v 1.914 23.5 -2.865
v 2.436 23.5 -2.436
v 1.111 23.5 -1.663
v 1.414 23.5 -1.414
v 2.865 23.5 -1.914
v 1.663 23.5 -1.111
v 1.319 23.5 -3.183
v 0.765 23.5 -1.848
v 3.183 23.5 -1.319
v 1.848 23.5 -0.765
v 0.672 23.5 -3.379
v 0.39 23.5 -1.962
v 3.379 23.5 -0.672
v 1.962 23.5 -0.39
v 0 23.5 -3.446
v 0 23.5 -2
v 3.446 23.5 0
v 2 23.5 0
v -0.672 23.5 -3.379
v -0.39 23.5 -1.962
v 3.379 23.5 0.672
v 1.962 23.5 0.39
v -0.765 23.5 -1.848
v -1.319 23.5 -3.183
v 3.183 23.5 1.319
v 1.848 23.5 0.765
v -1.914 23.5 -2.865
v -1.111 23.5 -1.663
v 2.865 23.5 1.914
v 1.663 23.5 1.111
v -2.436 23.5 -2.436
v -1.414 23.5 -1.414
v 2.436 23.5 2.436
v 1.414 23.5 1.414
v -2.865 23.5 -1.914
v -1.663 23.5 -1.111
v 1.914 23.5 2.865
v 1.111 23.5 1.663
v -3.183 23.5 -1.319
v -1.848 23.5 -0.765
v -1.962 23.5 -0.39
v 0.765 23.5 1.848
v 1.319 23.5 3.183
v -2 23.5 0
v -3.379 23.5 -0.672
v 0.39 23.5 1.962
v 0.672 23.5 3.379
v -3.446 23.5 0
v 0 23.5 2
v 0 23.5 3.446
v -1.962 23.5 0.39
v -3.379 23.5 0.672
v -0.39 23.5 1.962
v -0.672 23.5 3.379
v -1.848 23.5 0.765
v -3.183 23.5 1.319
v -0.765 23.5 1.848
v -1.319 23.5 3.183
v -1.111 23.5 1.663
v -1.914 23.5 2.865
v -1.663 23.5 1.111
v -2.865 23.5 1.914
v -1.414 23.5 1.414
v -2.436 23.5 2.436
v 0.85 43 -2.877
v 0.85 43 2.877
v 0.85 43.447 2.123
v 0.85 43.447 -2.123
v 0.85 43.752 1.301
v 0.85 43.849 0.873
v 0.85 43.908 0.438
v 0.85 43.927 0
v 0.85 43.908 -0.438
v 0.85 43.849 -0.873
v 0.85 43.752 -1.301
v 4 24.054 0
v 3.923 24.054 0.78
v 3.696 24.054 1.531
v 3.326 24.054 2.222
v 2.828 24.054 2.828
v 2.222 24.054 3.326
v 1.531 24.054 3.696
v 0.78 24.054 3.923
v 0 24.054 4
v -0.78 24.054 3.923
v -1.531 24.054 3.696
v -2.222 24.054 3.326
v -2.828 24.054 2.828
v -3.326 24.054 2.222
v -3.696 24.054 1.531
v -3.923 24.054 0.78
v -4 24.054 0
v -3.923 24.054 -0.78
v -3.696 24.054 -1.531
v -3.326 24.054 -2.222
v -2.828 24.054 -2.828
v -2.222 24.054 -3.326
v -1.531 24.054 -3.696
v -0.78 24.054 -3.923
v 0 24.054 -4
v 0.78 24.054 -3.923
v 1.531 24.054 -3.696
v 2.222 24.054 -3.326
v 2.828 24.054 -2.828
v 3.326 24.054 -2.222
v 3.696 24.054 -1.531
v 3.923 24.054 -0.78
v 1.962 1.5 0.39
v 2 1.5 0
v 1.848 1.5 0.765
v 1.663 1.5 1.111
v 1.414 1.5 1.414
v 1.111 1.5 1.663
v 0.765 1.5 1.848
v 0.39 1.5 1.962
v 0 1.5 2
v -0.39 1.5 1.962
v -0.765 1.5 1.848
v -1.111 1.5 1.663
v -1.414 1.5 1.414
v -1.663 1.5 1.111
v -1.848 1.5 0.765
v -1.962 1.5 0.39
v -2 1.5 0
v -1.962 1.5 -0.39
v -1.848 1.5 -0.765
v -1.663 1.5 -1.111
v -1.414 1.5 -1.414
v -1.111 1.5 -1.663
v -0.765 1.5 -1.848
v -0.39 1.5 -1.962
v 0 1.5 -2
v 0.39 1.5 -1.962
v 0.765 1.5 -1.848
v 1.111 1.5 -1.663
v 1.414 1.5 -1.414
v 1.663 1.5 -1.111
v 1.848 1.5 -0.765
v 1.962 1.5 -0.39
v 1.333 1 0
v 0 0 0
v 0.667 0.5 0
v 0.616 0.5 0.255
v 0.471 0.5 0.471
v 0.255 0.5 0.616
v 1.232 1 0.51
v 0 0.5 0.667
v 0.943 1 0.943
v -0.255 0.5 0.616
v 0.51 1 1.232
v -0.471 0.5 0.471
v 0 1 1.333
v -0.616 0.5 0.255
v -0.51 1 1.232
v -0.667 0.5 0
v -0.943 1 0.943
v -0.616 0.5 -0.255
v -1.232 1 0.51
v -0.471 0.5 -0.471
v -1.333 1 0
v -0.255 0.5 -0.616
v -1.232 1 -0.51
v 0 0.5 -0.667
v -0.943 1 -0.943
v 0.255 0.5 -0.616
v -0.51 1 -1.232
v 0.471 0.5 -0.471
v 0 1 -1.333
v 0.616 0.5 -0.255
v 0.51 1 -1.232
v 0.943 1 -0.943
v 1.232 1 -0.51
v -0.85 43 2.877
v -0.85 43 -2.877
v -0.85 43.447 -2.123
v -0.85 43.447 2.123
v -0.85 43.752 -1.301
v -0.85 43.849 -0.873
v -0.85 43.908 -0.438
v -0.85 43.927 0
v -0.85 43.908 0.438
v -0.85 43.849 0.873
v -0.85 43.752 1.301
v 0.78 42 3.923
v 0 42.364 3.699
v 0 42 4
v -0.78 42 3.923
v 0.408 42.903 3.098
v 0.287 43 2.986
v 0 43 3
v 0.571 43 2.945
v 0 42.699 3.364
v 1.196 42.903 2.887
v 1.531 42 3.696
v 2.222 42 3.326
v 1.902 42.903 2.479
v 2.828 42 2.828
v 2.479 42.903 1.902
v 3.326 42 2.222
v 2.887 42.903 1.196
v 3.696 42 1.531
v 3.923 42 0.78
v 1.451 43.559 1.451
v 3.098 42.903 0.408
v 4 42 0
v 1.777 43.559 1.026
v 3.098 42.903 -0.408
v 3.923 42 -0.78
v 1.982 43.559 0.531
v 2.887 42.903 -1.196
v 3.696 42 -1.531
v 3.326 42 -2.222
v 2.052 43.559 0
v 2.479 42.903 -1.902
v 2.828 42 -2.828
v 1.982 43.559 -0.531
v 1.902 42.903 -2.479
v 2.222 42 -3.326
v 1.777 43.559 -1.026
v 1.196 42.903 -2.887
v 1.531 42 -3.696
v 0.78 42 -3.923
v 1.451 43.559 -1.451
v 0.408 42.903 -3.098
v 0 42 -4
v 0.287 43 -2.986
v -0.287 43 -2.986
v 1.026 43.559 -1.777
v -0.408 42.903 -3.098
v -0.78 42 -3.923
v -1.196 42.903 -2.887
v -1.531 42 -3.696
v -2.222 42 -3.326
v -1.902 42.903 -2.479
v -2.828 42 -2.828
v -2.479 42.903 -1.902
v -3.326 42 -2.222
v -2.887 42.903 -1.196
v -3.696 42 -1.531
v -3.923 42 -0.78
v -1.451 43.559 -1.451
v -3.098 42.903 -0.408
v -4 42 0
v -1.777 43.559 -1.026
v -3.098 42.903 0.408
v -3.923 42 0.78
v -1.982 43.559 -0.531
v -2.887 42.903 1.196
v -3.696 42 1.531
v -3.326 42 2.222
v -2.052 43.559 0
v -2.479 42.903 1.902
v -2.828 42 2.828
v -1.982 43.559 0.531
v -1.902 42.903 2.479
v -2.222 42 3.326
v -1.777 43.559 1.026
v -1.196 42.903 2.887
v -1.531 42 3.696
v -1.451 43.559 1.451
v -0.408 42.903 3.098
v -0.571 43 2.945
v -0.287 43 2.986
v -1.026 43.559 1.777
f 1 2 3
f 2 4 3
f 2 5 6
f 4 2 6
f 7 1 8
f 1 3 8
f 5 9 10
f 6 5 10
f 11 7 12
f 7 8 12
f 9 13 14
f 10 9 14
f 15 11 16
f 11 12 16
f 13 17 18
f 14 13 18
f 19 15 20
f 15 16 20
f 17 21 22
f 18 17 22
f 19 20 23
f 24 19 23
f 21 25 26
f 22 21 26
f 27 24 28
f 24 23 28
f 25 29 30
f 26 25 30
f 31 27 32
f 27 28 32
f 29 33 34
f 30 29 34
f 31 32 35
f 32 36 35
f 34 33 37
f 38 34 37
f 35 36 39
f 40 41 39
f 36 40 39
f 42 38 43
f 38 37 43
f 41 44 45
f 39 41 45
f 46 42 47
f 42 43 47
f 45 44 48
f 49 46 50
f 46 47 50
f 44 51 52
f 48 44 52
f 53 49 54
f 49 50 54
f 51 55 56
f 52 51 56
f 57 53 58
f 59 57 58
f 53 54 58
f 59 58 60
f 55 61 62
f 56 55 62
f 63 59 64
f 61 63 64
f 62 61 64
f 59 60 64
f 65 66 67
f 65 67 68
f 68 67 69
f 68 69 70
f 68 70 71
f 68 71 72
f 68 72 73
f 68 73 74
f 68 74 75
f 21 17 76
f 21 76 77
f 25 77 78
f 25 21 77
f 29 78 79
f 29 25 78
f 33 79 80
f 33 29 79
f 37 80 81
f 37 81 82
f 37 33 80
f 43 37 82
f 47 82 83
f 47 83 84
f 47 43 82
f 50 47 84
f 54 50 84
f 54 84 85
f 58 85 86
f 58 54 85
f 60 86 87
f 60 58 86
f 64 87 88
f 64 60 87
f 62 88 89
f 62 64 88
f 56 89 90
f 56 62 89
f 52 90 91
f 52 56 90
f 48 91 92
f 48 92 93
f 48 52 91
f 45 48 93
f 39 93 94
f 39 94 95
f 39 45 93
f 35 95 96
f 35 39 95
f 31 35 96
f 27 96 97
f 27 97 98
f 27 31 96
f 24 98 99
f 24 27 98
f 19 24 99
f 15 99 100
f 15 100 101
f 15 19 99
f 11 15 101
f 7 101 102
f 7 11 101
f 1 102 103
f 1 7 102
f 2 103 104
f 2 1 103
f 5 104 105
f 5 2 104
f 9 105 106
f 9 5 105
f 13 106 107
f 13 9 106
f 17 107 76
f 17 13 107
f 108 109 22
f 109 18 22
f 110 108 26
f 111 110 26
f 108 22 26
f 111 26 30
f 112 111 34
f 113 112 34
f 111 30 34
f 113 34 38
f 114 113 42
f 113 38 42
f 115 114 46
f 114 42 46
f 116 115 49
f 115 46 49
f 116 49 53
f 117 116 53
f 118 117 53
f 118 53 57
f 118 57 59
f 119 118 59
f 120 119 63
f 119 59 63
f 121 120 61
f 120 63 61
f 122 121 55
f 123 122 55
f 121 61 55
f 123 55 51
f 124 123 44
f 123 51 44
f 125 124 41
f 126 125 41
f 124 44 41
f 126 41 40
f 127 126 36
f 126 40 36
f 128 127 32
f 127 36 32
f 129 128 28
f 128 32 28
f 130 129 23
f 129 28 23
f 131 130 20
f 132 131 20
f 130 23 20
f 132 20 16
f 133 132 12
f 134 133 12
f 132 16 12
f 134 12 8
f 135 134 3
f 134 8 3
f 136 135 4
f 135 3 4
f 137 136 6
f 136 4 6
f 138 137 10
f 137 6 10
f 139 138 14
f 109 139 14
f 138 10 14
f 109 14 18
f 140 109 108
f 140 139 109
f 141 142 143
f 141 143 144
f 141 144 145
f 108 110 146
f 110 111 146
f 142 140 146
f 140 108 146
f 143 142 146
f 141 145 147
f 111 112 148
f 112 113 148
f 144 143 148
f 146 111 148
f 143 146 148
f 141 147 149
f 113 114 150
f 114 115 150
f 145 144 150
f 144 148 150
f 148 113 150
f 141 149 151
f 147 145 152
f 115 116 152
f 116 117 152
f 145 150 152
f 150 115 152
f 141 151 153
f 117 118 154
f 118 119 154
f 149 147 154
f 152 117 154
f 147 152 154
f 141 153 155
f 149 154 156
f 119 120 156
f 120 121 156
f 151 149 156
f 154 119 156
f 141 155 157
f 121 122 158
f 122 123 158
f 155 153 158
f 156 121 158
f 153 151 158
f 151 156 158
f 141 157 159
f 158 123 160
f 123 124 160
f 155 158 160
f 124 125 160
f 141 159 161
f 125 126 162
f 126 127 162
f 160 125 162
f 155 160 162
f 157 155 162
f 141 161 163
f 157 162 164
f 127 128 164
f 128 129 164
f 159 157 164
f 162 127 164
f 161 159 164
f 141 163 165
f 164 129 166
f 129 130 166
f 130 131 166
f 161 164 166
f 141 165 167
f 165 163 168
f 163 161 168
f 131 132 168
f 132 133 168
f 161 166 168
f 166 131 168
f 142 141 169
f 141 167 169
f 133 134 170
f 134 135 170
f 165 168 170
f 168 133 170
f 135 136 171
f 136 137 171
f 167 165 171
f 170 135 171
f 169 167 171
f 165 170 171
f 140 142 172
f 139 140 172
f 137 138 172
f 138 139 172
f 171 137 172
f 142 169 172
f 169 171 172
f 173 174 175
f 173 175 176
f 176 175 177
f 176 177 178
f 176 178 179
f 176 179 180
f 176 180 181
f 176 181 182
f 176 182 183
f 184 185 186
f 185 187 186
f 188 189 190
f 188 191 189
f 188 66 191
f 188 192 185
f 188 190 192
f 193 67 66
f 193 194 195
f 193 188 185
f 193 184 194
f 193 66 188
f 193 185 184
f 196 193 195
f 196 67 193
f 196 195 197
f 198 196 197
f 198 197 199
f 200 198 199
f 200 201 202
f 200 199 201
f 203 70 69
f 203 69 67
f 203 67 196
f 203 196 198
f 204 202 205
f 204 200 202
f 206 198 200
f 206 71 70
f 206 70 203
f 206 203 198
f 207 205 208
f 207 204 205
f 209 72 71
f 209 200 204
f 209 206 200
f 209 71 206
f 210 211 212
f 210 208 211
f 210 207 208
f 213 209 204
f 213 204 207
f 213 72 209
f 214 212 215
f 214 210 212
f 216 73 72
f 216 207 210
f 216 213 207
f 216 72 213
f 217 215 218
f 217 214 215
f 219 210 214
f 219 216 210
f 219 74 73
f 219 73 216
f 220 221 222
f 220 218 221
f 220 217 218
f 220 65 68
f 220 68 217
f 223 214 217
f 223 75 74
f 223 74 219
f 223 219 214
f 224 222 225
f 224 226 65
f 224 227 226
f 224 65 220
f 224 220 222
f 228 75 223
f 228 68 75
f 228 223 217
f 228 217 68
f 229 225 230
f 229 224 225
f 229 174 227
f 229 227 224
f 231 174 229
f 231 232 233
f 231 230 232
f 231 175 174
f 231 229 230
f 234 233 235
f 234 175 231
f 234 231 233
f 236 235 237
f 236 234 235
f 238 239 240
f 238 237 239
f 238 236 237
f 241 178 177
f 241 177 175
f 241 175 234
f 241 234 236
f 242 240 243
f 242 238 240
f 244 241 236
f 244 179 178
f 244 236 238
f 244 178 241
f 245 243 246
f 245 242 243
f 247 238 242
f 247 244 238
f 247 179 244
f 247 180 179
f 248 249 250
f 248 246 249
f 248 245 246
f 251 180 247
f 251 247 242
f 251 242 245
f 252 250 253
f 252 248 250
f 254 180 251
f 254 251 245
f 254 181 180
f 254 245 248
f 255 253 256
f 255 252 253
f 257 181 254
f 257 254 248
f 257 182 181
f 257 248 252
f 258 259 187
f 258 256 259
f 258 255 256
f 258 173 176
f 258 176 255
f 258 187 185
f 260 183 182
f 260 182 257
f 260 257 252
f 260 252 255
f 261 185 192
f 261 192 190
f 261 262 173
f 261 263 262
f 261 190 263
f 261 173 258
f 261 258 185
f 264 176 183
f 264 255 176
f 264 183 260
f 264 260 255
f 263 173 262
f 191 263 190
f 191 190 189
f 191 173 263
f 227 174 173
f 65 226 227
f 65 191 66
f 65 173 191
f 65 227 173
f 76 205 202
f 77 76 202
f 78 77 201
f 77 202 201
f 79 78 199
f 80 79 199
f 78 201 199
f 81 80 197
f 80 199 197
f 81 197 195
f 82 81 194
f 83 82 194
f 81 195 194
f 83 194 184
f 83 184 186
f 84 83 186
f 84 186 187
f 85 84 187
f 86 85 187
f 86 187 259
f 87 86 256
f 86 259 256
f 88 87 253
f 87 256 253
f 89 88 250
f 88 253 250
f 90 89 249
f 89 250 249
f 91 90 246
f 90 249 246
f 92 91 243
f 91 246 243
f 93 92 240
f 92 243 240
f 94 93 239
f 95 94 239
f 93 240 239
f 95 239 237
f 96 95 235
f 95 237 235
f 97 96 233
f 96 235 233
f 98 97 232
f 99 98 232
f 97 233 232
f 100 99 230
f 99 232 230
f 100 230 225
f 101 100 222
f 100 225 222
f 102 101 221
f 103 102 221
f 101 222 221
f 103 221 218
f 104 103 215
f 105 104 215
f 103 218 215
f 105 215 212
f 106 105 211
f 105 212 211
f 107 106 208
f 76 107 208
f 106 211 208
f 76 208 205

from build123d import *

# Parameters (mm, degrees)
DOME_1_FACE_RADIUS       = 4
DOME_1_HEIGHT            = 2
SKETCH_3_W               = 1.7
SKETCH_3_H               = 10
CUT_EXTRUDE_1_DEPTH      = 5
CUT_EXTRUDE_1_DEPTH_BACK = 5
CHAMFER_1_SIZE           = 0.5545


with BuildPart() as part:
    # Sketch 2 → Revolve 1 (revolve)
    with BuildSketch(Plane.XY):
        Polygon((0, 0), (2, 1.5), (2, 23.5), (4, 23.5), (4, 42), (0, 42), align=None)
    revolve(axis=Axis((0, 42, 0), (0, -1, 0)))

    # Dome 1: a dome of height H over a round flat face of radius A is a cap of a sphere of radius (A * A + H * H) / (2 * H)
    dome_1_r = (DOME_1_FACE_RADIUS * DOME_1_FACE_RADIUS + DOME_1_HEIGHT * DOME_1_HEIGHT) / (2 * DOME_1_HEIGHT)
    dome_1_base = Plane((0, 42, 0), z_dir=(0, 1, 0))
    with Locations(dome_1_base.offset(DOME_1_HEIGHT - dome_1_r)):
        dome_1_ball = Sphere(dome_1_r, mode=Mode.PRIVATE)
    add(split(dome_1_ball, bisect_by=dome_1_base, keep=Keep.TOP, mode=Mode.PRIVATE))

    # Sketch 3 → Cut-Extrude 1 (cut, two sides)
    with BuildSketch(Plane.XY) as cut_extrude_1_sk:
        with Locations((0, 48)):
            Rectangle(SKETCH_3_W, SKETCH_3_H)
    extrude(amount=CUT_EXTRUDE_1_DEPTH, mode=Mode.SUBTRACT)
    extrude(cut_extrude_1_sk.sketch, amount=-CUT_EXTRUDE_1_DEPTH_BACK, mode=Mode.SUBTRACT)

    # Chamfer 1
    chamfer_1_edges = [part.edges().sort_by_distance(p)[0] for p in [
        (-4, 23.5, 0),
    ]]
    chamfer(chamfer_1_edges, length=CHAMFER_1_SIZE)


solid = part.part
